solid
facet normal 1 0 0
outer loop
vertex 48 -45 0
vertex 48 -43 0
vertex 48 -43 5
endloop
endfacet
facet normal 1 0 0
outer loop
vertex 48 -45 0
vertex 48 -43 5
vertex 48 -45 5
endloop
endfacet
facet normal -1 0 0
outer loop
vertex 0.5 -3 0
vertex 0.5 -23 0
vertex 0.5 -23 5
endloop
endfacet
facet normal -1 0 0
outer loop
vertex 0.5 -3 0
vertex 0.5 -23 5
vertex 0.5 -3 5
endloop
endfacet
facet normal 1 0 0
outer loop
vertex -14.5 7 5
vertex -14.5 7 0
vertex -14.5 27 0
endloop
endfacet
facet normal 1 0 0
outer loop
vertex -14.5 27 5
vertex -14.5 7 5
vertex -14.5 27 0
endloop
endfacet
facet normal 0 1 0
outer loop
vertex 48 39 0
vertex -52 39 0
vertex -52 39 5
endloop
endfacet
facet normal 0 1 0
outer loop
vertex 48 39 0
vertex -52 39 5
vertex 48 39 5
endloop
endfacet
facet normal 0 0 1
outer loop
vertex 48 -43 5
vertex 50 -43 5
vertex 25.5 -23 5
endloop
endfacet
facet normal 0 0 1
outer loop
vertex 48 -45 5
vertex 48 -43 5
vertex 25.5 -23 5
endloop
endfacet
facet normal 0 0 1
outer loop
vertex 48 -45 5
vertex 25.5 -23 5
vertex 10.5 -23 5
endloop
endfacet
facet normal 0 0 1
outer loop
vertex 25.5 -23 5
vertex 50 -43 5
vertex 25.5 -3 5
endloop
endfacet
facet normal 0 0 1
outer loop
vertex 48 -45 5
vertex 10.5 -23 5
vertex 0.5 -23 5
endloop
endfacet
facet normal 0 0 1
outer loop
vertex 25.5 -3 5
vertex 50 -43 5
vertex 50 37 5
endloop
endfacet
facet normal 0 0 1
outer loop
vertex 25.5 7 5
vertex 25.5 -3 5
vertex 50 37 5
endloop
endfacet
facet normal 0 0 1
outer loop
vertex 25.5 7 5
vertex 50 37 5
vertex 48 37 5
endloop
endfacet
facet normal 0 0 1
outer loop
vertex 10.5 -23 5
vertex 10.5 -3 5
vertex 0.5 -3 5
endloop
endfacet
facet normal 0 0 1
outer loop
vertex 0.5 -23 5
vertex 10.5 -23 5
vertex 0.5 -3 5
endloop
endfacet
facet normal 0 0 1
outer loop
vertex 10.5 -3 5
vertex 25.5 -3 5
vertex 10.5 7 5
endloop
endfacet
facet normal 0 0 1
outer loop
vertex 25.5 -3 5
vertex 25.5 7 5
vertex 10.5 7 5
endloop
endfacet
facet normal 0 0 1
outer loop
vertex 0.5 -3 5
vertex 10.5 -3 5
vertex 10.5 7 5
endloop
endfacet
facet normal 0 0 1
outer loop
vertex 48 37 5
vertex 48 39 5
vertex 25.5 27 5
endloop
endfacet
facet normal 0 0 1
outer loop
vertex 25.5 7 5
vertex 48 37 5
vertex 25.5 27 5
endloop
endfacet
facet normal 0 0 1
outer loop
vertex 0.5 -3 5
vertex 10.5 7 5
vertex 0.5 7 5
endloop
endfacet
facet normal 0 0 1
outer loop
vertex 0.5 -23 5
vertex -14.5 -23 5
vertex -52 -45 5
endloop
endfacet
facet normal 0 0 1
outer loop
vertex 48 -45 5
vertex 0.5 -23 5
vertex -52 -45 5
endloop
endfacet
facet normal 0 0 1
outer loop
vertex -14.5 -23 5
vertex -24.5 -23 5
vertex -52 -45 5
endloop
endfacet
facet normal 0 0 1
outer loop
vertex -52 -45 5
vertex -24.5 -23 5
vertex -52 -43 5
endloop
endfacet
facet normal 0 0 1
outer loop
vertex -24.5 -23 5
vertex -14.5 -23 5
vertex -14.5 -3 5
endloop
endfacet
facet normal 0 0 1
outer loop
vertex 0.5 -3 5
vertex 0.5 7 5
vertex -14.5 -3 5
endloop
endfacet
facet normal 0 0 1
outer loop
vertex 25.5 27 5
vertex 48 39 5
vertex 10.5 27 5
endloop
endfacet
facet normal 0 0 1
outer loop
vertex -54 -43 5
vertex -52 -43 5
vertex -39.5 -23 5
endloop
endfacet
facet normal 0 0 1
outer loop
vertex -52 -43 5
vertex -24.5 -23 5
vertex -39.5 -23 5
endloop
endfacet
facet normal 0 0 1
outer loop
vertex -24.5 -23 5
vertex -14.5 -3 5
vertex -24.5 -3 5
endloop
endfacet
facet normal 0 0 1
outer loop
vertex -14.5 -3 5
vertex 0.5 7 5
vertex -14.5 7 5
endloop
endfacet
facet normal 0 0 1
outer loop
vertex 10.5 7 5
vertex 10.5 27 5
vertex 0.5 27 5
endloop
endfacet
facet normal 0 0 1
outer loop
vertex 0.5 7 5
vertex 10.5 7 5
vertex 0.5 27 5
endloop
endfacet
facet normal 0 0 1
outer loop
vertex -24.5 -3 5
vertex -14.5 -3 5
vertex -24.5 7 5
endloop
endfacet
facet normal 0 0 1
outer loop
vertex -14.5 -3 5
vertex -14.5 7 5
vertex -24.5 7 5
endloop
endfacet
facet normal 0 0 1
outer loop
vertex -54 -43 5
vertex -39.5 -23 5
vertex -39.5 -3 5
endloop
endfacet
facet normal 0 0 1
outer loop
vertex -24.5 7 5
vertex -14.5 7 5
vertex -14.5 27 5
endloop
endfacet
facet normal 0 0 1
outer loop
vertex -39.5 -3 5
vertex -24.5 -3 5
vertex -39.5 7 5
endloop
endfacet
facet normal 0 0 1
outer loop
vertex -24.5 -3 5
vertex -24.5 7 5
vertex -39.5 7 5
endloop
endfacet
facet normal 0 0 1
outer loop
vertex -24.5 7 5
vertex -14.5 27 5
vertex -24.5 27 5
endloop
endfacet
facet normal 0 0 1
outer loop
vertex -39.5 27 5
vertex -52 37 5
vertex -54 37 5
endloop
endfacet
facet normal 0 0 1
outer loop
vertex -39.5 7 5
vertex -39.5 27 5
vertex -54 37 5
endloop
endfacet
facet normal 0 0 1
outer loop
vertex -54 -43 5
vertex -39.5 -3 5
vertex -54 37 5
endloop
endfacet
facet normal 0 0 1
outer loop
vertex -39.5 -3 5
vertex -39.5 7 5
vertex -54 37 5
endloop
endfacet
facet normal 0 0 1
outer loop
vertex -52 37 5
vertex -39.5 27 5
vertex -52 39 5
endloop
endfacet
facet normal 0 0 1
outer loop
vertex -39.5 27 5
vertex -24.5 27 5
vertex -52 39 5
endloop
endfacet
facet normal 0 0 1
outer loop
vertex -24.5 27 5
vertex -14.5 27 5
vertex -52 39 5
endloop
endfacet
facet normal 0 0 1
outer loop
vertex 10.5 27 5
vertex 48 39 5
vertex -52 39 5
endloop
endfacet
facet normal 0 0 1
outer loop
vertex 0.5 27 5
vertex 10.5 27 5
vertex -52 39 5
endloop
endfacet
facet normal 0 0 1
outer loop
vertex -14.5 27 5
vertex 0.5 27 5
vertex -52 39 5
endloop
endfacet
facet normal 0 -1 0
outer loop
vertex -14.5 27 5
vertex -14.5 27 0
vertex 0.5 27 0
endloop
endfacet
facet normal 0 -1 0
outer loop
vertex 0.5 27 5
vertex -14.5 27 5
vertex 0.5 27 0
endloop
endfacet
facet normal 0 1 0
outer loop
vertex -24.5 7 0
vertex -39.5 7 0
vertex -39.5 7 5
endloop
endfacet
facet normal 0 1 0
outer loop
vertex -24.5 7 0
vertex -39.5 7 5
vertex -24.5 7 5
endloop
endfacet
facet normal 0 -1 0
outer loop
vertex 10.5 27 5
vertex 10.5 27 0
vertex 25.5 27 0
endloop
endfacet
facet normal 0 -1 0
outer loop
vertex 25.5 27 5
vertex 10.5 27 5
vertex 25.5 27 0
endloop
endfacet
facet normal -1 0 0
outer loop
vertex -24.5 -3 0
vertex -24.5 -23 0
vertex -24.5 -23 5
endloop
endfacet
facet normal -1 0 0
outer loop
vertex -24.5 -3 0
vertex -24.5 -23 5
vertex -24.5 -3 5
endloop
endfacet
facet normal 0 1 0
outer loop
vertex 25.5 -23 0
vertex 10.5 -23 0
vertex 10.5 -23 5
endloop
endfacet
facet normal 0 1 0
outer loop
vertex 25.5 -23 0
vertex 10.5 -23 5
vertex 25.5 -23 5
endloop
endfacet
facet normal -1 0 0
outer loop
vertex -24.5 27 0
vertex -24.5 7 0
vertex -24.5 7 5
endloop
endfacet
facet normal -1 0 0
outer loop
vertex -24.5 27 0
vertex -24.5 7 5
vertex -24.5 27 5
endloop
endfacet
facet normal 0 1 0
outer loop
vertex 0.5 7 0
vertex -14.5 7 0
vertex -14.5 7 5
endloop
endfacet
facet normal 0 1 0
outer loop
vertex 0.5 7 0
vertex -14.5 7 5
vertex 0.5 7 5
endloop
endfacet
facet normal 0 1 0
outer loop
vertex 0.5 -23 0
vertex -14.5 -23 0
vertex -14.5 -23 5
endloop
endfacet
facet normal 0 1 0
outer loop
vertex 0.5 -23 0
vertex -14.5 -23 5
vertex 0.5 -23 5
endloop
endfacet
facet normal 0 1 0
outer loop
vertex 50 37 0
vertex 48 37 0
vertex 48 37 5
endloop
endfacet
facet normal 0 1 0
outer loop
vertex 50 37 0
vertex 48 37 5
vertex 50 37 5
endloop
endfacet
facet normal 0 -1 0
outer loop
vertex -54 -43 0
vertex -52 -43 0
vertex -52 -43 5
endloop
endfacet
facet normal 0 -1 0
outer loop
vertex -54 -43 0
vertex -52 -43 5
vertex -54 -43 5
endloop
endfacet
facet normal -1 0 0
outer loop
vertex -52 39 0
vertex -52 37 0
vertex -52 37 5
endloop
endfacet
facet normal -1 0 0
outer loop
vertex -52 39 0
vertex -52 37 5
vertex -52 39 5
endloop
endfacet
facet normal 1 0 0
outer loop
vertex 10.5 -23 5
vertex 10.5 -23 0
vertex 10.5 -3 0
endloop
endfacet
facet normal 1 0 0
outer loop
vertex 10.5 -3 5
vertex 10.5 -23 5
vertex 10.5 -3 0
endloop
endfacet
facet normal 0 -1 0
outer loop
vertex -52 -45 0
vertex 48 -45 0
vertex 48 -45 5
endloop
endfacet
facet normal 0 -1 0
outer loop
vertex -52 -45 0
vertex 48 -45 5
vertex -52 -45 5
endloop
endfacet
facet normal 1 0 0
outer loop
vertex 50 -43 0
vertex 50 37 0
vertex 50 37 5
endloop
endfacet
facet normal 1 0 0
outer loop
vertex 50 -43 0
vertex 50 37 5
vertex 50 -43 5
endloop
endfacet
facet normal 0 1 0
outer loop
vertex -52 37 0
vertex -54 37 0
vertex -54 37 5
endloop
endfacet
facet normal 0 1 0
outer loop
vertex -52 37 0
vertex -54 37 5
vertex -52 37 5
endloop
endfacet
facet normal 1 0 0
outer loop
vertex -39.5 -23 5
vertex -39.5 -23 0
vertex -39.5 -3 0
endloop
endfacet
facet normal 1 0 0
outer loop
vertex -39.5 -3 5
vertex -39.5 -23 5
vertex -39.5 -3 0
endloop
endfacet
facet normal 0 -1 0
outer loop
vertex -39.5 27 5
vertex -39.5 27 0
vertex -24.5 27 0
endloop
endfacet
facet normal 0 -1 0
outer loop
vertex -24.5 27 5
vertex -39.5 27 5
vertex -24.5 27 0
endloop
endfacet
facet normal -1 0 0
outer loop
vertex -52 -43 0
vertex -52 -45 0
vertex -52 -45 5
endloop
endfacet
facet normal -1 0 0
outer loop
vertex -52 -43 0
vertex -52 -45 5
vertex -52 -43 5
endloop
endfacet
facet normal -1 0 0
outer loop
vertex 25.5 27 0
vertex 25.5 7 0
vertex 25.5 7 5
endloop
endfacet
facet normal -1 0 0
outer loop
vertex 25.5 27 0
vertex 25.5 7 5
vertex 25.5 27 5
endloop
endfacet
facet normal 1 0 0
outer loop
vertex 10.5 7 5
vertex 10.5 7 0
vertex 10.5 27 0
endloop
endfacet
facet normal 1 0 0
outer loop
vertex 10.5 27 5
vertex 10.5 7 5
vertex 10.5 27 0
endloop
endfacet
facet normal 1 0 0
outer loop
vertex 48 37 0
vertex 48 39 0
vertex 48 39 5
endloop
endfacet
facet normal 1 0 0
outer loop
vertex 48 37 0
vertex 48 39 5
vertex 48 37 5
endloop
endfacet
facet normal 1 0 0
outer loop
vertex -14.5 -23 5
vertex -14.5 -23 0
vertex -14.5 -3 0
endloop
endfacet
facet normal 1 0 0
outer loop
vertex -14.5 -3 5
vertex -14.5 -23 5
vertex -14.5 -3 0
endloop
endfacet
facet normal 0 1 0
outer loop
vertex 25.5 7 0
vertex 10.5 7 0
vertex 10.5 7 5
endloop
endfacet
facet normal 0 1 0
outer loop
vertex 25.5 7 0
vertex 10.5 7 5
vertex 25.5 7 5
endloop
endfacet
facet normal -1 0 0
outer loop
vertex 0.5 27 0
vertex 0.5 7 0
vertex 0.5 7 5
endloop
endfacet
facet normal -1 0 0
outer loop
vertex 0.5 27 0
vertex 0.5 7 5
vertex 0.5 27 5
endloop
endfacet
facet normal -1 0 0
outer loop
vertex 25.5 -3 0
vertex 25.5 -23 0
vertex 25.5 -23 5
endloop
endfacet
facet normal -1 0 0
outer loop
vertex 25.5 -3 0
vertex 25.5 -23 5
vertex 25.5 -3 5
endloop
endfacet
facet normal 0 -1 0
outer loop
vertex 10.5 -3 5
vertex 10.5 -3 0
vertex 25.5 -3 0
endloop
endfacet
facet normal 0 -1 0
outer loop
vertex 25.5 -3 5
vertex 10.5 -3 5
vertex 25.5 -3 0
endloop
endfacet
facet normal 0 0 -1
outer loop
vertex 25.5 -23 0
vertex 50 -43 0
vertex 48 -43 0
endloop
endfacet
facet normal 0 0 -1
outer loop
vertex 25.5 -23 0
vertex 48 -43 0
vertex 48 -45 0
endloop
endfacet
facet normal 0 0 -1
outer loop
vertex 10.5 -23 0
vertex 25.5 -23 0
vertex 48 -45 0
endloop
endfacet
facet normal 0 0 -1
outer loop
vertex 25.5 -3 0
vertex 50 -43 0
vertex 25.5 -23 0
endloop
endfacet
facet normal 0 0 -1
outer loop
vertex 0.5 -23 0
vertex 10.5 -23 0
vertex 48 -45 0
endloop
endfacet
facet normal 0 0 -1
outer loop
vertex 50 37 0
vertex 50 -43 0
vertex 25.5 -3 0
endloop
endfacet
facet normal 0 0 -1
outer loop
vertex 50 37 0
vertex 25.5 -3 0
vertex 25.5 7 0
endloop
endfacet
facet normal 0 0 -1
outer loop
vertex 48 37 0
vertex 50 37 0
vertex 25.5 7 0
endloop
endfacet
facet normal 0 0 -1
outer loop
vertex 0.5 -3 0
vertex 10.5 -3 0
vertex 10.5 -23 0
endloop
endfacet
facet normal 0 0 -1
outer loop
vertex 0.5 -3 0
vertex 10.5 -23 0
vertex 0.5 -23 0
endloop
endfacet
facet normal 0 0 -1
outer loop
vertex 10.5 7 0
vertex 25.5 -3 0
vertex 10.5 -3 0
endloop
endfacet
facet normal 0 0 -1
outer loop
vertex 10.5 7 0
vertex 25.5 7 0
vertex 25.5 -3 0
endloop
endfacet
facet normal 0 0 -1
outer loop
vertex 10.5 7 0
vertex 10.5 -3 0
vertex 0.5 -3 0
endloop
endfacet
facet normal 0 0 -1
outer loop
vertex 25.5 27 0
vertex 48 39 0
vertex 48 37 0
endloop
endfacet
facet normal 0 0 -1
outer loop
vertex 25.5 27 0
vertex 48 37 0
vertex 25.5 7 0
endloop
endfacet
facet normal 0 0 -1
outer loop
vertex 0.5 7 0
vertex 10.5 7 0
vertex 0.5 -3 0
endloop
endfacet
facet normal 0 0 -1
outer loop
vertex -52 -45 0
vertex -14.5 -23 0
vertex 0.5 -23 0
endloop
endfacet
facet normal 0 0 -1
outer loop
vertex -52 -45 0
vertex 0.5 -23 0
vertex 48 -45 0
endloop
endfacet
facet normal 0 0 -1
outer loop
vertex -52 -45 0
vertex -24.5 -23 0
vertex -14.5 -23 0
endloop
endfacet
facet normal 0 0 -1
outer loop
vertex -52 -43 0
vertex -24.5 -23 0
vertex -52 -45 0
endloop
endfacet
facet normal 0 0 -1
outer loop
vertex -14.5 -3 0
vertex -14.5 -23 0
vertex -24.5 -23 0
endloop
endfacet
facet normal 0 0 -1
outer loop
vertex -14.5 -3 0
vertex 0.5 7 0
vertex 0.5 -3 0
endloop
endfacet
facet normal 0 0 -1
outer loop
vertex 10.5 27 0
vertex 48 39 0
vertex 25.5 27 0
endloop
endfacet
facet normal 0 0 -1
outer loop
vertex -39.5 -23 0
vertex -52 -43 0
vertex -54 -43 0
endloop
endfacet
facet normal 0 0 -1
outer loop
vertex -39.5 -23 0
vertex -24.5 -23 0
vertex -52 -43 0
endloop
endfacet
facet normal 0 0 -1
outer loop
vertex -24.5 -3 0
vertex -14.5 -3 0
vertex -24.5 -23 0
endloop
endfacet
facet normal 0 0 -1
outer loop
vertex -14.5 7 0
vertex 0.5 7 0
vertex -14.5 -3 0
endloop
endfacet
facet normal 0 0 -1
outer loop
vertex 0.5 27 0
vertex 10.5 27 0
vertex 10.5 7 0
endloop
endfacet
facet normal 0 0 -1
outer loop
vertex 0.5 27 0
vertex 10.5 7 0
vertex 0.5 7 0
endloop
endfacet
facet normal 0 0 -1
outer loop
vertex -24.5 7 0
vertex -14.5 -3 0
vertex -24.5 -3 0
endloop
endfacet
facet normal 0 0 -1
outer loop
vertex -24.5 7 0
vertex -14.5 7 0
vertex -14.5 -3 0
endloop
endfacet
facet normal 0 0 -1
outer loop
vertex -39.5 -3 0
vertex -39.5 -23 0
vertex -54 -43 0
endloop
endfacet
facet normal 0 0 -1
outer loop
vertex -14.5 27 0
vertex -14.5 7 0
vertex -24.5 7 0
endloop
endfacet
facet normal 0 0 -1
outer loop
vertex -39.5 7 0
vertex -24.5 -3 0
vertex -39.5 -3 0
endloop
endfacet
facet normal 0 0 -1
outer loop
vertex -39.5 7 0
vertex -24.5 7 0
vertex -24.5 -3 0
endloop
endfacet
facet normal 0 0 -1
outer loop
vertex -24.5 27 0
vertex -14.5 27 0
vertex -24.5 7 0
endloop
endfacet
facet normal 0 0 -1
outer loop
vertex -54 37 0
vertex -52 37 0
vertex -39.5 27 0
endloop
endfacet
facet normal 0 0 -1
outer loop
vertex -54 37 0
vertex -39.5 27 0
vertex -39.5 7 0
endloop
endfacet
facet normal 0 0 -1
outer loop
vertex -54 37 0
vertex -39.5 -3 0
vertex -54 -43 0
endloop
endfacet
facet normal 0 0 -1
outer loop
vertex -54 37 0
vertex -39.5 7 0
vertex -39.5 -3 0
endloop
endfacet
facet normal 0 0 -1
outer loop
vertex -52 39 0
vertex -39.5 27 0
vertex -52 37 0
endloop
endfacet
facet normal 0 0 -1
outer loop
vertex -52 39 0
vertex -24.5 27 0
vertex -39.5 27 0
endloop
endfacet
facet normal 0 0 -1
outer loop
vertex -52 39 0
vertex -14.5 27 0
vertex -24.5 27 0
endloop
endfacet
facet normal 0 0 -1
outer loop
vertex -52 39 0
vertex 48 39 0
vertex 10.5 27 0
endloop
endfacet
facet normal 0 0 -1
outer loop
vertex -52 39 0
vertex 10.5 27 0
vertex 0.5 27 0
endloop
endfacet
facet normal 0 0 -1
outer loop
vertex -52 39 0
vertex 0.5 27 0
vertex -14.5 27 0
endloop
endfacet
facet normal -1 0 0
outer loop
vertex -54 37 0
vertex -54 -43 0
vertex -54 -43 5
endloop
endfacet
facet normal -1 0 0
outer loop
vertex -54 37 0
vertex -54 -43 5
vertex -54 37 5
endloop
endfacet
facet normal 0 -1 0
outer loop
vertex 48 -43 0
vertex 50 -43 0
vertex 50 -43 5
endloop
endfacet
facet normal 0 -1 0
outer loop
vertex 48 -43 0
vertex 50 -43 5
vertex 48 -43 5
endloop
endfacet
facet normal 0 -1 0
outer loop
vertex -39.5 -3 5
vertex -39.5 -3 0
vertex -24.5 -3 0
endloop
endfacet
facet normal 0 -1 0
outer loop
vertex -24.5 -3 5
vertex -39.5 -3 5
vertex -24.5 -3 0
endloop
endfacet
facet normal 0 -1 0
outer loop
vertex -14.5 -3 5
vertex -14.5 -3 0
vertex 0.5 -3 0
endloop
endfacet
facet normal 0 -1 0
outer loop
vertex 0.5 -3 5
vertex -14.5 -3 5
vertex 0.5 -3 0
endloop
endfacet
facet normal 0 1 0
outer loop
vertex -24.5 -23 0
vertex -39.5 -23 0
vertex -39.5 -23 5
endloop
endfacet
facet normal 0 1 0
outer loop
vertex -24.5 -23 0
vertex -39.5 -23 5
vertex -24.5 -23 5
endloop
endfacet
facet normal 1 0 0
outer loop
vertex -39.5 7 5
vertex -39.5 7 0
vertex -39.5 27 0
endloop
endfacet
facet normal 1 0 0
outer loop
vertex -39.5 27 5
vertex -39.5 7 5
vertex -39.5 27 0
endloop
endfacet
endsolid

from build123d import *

# Parameters (mm, degrees)
SKETCH1_W           = 15
SKETCH1_H           = 20
BOSS_EXTRUDE1_DEPTH = 5


with BuildPart() as part:
    # Sketch1 → Boss-Extrude1 (new body)
    with BuildSketch(Plane.XY):
        Polygon((-54, -43), (-54, 37), (-52, 37), (-52, 39), (48, 39), (48, 37), (50, 37), (50, -43), (48, -43), (48, -45), (-52, -45), (-52, -43), align=None)
        with Locations((-7, 17)):
            Rectangle(SKETCH1_W, SKETCH1_H, mode=Mode.SUBTRACT)
        with Locations((-32, 17)):
            Rectangle(SKETCH1_W, SKETCH1_H, mode=Mode.SUBTRACT)
        with Locations((18, 17)):
            Rectangle(SKETCH1_W, SKETCH1_H, mode=Mode.SUBTRACT)
        with Locations((-7, -13)):
            Rectangle(SKETCH1_W, SKETCH1_H, mode=Mode.SUBTRACT)
        with Locations((18, -13)):
            Rectangle(SKETCH1_W, SKETCH1_H, mode=Mode.SUBTRACT)
        with Locations((-32, -13)):
            Rectangle(SKETCH1_W, SKETCH1_H, mode=Mode.SUBTRACT)
    extrude(amount=BOSS_EXTRUDE1_DEPTH)


solid = part.part
